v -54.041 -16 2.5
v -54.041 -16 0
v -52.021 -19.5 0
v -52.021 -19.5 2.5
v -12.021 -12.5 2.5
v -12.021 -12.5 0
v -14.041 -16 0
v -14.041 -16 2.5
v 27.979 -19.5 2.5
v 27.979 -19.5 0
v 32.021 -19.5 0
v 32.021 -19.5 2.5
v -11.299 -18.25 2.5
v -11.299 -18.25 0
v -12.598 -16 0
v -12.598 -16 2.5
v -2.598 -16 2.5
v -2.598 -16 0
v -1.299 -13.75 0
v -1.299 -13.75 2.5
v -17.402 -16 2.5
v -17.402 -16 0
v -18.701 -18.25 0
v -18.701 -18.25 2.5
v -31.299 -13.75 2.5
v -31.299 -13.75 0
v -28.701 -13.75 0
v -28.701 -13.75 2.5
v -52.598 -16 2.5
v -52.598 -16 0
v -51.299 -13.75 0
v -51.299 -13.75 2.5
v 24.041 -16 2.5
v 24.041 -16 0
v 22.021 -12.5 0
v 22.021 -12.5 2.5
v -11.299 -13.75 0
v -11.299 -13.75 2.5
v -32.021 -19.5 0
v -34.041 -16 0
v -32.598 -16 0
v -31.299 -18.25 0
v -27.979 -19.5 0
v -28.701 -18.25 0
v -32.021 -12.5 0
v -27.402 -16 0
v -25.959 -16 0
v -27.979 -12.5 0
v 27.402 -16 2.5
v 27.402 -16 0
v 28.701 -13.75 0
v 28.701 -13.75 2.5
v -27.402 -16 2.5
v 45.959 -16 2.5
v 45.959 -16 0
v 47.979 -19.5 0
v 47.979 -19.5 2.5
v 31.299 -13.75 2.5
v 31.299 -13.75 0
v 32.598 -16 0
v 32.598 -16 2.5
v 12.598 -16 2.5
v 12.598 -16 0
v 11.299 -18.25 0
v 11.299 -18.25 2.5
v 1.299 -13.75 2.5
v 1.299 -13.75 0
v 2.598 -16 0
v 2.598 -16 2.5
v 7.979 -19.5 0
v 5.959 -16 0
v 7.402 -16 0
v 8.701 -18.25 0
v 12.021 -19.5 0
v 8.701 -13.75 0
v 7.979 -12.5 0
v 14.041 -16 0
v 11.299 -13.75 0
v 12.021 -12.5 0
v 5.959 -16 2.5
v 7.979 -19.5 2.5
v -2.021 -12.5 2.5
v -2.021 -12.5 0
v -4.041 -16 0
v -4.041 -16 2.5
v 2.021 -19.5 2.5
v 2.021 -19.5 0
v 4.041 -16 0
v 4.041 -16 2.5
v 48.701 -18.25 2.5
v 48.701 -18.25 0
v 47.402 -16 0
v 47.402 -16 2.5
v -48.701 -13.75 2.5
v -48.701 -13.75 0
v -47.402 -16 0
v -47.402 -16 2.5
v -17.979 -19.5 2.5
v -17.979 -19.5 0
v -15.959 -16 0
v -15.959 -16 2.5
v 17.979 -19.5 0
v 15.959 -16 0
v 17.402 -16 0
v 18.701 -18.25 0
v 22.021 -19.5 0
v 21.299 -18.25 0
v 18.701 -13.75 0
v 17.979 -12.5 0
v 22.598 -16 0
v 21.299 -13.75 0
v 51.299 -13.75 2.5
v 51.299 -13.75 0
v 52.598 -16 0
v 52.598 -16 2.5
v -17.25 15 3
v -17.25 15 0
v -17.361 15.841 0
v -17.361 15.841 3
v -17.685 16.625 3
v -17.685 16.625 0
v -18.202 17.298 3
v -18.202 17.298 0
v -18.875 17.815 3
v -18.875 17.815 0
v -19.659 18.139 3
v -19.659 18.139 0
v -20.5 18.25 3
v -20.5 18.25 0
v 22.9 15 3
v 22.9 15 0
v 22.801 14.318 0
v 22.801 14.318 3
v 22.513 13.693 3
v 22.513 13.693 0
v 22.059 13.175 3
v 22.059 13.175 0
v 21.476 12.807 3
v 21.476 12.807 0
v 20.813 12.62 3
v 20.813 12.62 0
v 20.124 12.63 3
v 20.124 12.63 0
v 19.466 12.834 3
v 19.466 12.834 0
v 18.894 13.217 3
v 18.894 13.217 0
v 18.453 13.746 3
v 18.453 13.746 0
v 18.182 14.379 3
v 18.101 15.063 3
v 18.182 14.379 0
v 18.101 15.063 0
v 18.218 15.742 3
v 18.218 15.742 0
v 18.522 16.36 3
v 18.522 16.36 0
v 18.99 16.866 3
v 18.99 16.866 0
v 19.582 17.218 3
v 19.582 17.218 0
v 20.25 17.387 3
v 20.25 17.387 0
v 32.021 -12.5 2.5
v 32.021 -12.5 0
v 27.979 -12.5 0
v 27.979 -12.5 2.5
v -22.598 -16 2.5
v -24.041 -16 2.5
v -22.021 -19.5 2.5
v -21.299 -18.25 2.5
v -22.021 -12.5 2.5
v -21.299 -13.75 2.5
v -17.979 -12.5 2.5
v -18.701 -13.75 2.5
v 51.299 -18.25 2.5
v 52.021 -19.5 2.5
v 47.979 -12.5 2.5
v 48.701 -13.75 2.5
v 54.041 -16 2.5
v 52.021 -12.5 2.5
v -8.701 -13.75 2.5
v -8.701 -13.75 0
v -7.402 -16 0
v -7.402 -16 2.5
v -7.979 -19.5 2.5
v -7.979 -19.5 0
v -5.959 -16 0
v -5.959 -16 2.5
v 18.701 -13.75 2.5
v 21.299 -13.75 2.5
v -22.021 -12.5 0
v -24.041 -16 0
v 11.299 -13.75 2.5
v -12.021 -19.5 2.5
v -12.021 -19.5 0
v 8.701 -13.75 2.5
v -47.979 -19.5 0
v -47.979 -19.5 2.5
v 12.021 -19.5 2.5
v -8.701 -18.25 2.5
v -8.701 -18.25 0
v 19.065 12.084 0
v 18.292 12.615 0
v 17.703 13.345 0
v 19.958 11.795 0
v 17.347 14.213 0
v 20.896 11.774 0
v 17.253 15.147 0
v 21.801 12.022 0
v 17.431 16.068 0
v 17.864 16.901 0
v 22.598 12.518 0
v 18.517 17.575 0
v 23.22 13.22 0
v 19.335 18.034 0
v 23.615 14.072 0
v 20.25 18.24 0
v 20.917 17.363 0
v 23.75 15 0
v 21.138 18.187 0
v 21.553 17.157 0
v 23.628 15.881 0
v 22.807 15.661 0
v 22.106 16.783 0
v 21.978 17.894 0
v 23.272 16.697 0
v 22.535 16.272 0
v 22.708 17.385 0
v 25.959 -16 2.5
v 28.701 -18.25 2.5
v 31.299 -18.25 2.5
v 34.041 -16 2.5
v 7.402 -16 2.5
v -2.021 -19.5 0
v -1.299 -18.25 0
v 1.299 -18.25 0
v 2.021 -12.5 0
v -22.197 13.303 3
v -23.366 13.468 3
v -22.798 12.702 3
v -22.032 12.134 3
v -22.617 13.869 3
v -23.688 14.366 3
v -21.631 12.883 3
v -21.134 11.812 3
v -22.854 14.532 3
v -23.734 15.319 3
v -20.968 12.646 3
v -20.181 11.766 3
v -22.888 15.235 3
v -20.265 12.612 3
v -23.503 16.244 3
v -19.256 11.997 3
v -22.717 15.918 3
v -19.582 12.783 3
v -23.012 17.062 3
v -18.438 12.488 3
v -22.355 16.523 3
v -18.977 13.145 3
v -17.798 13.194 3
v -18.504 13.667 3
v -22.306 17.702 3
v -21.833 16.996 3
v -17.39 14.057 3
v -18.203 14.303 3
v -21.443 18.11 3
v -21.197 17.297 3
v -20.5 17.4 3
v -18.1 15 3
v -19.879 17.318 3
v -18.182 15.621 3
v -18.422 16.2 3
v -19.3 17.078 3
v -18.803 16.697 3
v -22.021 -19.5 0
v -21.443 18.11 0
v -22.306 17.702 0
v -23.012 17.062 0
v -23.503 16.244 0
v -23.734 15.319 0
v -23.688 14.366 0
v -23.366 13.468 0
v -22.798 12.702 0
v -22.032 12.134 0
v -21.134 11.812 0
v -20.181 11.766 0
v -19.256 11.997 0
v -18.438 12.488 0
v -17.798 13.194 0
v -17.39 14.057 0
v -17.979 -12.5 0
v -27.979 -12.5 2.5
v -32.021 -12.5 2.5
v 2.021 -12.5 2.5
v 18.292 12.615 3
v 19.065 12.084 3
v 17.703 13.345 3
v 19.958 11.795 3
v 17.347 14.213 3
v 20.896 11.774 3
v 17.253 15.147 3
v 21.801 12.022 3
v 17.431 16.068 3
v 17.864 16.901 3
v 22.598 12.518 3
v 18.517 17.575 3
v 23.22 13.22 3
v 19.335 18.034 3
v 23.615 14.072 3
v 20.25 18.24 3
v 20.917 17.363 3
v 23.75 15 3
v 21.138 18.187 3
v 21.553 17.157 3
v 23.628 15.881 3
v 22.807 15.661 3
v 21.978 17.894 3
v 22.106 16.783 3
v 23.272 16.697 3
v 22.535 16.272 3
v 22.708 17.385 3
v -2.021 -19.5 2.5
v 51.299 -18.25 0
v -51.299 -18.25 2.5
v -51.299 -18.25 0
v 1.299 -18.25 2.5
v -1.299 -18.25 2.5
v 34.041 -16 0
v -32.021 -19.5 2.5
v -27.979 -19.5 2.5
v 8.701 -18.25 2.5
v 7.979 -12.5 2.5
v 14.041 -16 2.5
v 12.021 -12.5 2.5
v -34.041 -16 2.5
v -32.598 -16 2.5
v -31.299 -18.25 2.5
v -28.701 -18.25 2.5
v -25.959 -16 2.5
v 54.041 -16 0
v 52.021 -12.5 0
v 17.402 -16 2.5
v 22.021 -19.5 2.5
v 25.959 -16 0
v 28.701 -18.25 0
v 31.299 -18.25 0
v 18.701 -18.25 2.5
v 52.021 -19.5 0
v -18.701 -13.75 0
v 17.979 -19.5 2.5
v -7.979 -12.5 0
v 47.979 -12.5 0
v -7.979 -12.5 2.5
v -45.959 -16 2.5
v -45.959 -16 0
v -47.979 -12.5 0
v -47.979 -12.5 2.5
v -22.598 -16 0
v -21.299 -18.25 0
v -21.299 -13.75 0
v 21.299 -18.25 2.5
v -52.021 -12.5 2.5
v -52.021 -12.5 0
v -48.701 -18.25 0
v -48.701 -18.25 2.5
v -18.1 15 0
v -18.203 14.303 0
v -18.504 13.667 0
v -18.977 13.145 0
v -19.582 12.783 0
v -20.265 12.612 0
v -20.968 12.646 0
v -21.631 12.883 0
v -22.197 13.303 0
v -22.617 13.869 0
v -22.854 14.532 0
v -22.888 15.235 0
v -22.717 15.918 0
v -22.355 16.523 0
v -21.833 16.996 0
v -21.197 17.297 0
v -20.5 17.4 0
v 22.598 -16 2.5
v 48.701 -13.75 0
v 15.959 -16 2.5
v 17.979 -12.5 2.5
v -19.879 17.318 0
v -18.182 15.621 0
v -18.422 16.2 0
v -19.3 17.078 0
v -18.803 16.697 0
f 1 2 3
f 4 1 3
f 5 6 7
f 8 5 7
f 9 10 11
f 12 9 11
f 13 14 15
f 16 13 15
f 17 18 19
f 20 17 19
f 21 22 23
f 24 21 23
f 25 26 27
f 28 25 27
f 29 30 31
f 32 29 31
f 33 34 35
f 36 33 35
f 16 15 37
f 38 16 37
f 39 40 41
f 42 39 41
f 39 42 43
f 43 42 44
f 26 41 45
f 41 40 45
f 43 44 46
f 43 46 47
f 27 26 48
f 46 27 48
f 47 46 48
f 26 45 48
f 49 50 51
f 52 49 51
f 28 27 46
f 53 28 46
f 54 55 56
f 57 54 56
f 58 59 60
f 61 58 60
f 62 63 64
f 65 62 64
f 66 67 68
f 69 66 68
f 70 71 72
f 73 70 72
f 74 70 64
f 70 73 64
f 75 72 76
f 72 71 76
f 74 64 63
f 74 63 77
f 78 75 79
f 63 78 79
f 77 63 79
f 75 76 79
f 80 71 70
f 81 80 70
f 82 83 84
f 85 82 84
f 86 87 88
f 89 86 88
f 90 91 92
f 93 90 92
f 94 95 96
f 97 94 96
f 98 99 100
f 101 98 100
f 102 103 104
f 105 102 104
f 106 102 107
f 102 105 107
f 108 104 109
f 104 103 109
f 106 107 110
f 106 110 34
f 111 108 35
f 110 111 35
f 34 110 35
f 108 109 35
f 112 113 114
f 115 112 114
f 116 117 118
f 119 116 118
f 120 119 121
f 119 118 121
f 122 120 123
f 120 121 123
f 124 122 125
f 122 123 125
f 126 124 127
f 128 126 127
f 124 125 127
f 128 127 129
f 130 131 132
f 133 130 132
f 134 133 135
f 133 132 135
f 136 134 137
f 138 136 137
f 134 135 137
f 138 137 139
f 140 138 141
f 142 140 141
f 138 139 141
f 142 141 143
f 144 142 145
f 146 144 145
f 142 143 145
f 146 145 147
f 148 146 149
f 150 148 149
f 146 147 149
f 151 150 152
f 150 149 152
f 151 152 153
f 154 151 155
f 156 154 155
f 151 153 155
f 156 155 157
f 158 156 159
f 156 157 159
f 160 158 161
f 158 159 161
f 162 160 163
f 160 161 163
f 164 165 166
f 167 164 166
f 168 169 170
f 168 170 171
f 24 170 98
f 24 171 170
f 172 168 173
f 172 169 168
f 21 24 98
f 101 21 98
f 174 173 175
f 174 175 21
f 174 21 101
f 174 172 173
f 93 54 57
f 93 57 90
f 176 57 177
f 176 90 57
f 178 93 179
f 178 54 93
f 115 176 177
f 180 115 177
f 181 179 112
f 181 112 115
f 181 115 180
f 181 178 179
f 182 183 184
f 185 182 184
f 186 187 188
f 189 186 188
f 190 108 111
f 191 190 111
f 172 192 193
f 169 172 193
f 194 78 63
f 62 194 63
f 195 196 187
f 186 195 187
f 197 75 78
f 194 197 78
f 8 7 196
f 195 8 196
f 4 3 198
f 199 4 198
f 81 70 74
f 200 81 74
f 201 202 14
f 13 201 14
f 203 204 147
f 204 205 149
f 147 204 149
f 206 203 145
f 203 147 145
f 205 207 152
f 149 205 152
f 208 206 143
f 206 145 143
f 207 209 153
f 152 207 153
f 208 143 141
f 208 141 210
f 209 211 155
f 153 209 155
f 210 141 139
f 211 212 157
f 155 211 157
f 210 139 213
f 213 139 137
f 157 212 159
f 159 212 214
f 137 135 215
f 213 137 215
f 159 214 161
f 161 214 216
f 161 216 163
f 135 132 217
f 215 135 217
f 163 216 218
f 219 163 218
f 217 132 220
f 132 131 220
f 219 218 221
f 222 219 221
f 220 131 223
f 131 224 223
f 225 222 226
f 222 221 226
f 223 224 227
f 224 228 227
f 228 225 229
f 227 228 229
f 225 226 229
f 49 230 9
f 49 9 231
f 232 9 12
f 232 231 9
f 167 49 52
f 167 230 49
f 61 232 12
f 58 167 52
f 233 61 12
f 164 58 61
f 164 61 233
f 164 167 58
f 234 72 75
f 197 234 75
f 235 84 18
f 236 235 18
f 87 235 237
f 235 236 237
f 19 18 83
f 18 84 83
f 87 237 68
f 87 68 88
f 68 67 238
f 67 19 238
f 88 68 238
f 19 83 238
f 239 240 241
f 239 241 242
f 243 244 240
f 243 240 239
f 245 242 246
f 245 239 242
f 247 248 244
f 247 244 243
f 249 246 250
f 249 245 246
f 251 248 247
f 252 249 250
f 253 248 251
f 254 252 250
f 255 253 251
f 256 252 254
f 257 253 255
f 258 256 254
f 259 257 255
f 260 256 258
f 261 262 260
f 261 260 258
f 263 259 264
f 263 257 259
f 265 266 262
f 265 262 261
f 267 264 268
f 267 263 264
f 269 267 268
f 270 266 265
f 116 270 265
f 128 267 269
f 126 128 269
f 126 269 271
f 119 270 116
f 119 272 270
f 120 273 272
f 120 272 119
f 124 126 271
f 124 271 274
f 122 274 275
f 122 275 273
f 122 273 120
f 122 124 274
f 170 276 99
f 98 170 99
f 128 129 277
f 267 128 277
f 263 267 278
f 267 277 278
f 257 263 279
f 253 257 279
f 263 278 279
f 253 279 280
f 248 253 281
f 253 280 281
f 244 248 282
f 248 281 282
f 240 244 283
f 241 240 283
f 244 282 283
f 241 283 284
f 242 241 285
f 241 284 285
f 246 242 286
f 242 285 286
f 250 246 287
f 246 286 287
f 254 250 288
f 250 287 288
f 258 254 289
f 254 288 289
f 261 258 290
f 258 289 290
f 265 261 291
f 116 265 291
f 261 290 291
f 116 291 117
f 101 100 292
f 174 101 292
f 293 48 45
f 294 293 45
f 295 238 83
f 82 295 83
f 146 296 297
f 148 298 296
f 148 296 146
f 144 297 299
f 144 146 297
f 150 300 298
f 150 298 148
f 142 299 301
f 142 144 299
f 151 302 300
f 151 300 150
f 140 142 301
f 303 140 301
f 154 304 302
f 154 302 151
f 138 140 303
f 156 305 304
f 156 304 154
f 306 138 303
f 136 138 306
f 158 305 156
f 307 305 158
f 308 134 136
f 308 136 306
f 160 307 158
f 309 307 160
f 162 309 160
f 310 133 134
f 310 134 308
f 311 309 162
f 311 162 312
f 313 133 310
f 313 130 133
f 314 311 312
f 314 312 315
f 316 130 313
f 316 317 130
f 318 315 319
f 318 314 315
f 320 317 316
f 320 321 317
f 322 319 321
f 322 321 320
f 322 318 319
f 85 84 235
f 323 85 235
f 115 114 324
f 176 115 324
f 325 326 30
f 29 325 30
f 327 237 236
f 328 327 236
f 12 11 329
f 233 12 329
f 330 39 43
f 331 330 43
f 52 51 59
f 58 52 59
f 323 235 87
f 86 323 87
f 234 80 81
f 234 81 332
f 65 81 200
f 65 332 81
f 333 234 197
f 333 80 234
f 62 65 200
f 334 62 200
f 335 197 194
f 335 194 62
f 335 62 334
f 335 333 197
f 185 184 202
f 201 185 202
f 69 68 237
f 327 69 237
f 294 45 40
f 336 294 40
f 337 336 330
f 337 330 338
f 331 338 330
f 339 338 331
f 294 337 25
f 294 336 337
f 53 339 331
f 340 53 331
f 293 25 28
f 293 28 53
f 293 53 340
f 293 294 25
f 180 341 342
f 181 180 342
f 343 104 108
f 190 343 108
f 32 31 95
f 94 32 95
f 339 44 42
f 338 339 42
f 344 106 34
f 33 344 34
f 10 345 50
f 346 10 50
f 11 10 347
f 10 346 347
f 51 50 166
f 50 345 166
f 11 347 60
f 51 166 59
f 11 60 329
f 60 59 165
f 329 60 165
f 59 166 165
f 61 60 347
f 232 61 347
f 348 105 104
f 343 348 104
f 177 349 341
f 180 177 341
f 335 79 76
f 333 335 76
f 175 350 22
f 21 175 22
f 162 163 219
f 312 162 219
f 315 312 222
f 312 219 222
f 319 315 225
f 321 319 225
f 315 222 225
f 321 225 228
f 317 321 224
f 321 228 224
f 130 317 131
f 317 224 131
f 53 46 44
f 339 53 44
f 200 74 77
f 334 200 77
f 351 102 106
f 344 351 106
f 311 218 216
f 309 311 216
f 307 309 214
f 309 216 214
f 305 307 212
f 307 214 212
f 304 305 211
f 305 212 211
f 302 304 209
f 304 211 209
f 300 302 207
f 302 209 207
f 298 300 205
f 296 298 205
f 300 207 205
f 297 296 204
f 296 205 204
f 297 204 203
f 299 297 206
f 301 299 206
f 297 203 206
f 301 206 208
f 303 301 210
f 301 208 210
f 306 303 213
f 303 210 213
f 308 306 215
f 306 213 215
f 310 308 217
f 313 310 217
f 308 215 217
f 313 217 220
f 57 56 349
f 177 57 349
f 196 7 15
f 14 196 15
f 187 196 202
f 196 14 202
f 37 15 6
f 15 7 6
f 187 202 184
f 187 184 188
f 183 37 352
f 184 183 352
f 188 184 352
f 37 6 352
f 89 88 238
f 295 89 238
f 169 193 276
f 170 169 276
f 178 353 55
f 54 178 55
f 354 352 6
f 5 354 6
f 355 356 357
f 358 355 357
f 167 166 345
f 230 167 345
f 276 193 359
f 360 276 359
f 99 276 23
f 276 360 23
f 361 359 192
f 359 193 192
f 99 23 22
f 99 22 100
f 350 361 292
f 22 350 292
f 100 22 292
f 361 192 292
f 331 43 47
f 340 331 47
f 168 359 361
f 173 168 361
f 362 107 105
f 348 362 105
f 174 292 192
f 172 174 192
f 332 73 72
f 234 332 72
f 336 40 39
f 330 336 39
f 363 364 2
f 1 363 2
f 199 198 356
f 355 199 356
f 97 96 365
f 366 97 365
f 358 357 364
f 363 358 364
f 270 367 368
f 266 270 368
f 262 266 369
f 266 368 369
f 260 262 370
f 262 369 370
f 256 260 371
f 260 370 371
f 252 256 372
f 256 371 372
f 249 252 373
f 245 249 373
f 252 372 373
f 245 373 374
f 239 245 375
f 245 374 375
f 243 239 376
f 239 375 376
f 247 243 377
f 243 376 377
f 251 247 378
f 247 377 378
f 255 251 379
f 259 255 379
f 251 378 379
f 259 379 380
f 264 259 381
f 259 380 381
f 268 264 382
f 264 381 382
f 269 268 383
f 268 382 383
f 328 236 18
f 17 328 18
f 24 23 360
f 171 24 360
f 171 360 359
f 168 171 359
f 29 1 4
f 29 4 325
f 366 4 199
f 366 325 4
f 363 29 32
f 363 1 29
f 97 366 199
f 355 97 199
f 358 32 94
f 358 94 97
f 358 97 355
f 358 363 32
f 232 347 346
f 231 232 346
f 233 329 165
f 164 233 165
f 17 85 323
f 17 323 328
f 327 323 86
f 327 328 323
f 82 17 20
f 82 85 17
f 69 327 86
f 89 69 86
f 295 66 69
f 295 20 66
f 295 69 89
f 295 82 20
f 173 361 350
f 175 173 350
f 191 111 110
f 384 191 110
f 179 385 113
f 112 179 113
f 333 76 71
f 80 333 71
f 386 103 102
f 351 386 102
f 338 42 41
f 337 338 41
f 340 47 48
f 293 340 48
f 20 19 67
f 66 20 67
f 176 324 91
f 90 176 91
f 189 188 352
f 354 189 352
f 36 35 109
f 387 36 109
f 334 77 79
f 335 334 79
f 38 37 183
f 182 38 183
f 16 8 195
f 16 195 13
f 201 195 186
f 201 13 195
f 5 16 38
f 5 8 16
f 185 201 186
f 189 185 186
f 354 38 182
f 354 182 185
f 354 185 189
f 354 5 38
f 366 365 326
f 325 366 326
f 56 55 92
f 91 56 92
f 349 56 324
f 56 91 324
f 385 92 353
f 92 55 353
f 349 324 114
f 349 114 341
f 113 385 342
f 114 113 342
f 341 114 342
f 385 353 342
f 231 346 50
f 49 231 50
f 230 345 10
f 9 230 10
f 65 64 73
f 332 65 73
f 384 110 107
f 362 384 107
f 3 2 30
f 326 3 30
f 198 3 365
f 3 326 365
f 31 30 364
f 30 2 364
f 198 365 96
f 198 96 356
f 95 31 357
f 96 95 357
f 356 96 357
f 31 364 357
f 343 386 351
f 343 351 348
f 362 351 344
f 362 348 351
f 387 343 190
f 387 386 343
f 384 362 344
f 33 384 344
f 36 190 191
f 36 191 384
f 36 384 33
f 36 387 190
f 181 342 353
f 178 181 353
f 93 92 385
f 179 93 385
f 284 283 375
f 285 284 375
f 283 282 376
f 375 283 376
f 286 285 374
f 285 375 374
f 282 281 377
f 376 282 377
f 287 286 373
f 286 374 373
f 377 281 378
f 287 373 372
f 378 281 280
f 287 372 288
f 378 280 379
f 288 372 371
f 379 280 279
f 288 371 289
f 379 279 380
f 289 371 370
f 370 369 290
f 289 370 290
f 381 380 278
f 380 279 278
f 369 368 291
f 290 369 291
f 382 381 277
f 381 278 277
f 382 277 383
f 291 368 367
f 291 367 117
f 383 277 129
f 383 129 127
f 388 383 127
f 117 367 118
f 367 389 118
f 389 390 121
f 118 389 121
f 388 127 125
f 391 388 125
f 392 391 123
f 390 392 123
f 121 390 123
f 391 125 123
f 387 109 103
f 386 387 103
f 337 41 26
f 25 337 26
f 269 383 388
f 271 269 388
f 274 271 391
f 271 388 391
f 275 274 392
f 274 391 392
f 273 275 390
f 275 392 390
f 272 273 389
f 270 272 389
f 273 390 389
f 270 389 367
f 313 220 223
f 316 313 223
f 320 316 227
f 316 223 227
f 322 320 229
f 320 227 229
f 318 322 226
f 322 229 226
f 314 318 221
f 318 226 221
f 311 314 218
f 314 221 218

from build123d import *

# Parameters (mm, degrees)
F1_DEPTH = 2.5
F2_DEPTH = 3


with BuildPart() as f1:
    # F0 (on Top) → F1 (new body)
    with BuildSketch(Plane.XY):
        Polygon((24.041452, -16), (22.020726, -12.5), (17.979274, -12.5), (15.958548, -16), (17.979274, -19.5), (22.020726, -19.5), align=None)
        Polygon((17.401924, -16), (18.700962, -13.75), (21.299038, -13.75), (22.598076, -16), (21.299038, -18.25), (18.700962, -18.25), align=None, mode=Mode.SUBTRACT)
        Polygon((12.020726, -12.5), (7.979274, -12.5), (5.958548, -16), (7.979274, -19.5), (12.020726, -19.5), (14.041452, -16), align=None)
        Polygon((7.401924, -16), (8.700962, -13.75), (11.299038, -13.75), (12.598076, -16), (11.299038, -18.25), (8.700962, -18.25), align=None, mode=Mode.SUBTRACT)
        Polygon((0, -18.25), (0, -19.5), (2.020726, -19.5), (4.041452, -16), (2.020726, -12.5), (0, -12.5), (0, -13.75), (1.299038, -13.75), (2.598076, -16), (1.299038, -18.25), align=None)
        Polygon((-2.020726, -19.5), (0, -19.5), (0, -18.25), (-1.299038, -18.25), (-2.598076, -16), (-1.299038, -13.75), (0, -13.75), (0, -12.5), (-2.020726, -12.5), (-4.041452, -16), align=None)
        Polygon((-5.958548, -16), (-7.979274, -12.5), (-12.020726, -12.5), (-14.041452, -16), (-12.020726, -19.5), (-7.979274, -19.5), align=None)
        Polygon((-12.598076, -16), (-11.299038, -13.75), (-8.700962, -13.75), (-7.401924, -16), (-8.700962, -18.25), (-11.299038, -18.25), align=None, mode=Mode.SUBTRACT)
        Polygon((-17.979274, -12.5), (-22.020726, -12.5), (-24.041452, -16), (-22.020726, -19.5), (-17.979274, -19.5), (-15.958548, -16), align=None)
        Polygon((-22.598076, -16), (-21.299038, -13.75), (-18.700962, -13.75), (-17.401924, -16), (-18.700962, -18.25), (-21.299038, -18.25), align=None, mode=Mode.SUBTRACT)
        Polygon((-27.979274, -12.5), (-32.020726, -12.5), (-34.041452, -16), (-32.020726, -19.5), (-27.979274, -19.5), (-25.958548, -16), align=None)
        Polygon((-32.598076, -16), (-31.299038, -13.75), (-28.700962, -13.75), (-27.401924, -16), (-28.700962, -18.25), (-31.299038, -18.25), align=None, mode=Mode.SUBTRACT)
        Polygon((-47.979274, -12.5), (-52.020726, -12.5), (-54.041452, -16), (-52.020726, -19.5), (-47.979274, -19.5), (-45.958548, -16), align=None)
        Polygon((-52.598076, -16), (-51.299038, -13.75), (-48.700962, -13.75), (-47.401924, -16), (-48.700962, -18.25), (-51.299038, -18.25), align=None, mode=Mode.SUBTRACT)
        Polygon((54.041452, -16), (52.020726, -12.5), (47.979274, -12.5), (45.958548, -16), (47.979274, -19.5), (52.020726, -19.5), align=None)
        Polygon((47.401924, -16), (48.700962, -13.75), (51.299038, -13.75), (52.598076, -16), (51.299038, -18.25), (48.700962, -18.25), align=None, mode=Mode.SUBTRACT)
        Polygon((34.041452, -16), (32.020726, -12.5), (27.979274, -12.5), (25.958548, -16), (27.979274, -19.5), (32.020726, -19.5), align=None)
        Polygon((27.401924, -16), (28.700962, -13.75), (31.299038, -13.75), (32.598076, -16), (31.299038, -18.25), (28.700962, -18.25), align=None, mode=Mode.SUBTRACT)
    extrude(amount=F1_DEPTH)


with BuildPart() as f2:
    # F0 (on Top) → F2 (new body)
    with BuildSketch(Plane.XY):
        with BuildLine():
            ThreePointArc((-17.25, 15), (-18.201903, 17.298097), (-20.5, 18.25))
            ThreePointArc((-20.5, 18.25), (-22.798097, 12.701903), (-17.25, 15))
        make_face()
        with BuildLine():
            ThreePointArc((-18.1, 15), (-22.197056, 13.302944), (-20.5, 17.4))
            ThreePointArc((-20.5, 17.4), (-18.802944, 16.697056), (-18.1, 15))
        make_face(mode=Mode.SUBTRACT)
        with BuildLine():
            ThreePointArc((23.75, 15), (22.70794, 17.384848), (20.25, 18.24037))
            ThreePointArc((20.25, 18.24037), (18.29206, 12.615152), (23.75, 15))
        make_face()
        with BuildLine():
            ThreePointArc((22.9, 15), (18.893762, 13.216745), (20.25, 17.386944))
            ThreePointArc((20.25, 17.386944), (22.106238, 16.783255), (22.9, 15))
        make_face(mode=Mode.SUBTRACT)
    extrude(amount=F2_DEPTH)


solid = Compound([f1.part, f2.part])
